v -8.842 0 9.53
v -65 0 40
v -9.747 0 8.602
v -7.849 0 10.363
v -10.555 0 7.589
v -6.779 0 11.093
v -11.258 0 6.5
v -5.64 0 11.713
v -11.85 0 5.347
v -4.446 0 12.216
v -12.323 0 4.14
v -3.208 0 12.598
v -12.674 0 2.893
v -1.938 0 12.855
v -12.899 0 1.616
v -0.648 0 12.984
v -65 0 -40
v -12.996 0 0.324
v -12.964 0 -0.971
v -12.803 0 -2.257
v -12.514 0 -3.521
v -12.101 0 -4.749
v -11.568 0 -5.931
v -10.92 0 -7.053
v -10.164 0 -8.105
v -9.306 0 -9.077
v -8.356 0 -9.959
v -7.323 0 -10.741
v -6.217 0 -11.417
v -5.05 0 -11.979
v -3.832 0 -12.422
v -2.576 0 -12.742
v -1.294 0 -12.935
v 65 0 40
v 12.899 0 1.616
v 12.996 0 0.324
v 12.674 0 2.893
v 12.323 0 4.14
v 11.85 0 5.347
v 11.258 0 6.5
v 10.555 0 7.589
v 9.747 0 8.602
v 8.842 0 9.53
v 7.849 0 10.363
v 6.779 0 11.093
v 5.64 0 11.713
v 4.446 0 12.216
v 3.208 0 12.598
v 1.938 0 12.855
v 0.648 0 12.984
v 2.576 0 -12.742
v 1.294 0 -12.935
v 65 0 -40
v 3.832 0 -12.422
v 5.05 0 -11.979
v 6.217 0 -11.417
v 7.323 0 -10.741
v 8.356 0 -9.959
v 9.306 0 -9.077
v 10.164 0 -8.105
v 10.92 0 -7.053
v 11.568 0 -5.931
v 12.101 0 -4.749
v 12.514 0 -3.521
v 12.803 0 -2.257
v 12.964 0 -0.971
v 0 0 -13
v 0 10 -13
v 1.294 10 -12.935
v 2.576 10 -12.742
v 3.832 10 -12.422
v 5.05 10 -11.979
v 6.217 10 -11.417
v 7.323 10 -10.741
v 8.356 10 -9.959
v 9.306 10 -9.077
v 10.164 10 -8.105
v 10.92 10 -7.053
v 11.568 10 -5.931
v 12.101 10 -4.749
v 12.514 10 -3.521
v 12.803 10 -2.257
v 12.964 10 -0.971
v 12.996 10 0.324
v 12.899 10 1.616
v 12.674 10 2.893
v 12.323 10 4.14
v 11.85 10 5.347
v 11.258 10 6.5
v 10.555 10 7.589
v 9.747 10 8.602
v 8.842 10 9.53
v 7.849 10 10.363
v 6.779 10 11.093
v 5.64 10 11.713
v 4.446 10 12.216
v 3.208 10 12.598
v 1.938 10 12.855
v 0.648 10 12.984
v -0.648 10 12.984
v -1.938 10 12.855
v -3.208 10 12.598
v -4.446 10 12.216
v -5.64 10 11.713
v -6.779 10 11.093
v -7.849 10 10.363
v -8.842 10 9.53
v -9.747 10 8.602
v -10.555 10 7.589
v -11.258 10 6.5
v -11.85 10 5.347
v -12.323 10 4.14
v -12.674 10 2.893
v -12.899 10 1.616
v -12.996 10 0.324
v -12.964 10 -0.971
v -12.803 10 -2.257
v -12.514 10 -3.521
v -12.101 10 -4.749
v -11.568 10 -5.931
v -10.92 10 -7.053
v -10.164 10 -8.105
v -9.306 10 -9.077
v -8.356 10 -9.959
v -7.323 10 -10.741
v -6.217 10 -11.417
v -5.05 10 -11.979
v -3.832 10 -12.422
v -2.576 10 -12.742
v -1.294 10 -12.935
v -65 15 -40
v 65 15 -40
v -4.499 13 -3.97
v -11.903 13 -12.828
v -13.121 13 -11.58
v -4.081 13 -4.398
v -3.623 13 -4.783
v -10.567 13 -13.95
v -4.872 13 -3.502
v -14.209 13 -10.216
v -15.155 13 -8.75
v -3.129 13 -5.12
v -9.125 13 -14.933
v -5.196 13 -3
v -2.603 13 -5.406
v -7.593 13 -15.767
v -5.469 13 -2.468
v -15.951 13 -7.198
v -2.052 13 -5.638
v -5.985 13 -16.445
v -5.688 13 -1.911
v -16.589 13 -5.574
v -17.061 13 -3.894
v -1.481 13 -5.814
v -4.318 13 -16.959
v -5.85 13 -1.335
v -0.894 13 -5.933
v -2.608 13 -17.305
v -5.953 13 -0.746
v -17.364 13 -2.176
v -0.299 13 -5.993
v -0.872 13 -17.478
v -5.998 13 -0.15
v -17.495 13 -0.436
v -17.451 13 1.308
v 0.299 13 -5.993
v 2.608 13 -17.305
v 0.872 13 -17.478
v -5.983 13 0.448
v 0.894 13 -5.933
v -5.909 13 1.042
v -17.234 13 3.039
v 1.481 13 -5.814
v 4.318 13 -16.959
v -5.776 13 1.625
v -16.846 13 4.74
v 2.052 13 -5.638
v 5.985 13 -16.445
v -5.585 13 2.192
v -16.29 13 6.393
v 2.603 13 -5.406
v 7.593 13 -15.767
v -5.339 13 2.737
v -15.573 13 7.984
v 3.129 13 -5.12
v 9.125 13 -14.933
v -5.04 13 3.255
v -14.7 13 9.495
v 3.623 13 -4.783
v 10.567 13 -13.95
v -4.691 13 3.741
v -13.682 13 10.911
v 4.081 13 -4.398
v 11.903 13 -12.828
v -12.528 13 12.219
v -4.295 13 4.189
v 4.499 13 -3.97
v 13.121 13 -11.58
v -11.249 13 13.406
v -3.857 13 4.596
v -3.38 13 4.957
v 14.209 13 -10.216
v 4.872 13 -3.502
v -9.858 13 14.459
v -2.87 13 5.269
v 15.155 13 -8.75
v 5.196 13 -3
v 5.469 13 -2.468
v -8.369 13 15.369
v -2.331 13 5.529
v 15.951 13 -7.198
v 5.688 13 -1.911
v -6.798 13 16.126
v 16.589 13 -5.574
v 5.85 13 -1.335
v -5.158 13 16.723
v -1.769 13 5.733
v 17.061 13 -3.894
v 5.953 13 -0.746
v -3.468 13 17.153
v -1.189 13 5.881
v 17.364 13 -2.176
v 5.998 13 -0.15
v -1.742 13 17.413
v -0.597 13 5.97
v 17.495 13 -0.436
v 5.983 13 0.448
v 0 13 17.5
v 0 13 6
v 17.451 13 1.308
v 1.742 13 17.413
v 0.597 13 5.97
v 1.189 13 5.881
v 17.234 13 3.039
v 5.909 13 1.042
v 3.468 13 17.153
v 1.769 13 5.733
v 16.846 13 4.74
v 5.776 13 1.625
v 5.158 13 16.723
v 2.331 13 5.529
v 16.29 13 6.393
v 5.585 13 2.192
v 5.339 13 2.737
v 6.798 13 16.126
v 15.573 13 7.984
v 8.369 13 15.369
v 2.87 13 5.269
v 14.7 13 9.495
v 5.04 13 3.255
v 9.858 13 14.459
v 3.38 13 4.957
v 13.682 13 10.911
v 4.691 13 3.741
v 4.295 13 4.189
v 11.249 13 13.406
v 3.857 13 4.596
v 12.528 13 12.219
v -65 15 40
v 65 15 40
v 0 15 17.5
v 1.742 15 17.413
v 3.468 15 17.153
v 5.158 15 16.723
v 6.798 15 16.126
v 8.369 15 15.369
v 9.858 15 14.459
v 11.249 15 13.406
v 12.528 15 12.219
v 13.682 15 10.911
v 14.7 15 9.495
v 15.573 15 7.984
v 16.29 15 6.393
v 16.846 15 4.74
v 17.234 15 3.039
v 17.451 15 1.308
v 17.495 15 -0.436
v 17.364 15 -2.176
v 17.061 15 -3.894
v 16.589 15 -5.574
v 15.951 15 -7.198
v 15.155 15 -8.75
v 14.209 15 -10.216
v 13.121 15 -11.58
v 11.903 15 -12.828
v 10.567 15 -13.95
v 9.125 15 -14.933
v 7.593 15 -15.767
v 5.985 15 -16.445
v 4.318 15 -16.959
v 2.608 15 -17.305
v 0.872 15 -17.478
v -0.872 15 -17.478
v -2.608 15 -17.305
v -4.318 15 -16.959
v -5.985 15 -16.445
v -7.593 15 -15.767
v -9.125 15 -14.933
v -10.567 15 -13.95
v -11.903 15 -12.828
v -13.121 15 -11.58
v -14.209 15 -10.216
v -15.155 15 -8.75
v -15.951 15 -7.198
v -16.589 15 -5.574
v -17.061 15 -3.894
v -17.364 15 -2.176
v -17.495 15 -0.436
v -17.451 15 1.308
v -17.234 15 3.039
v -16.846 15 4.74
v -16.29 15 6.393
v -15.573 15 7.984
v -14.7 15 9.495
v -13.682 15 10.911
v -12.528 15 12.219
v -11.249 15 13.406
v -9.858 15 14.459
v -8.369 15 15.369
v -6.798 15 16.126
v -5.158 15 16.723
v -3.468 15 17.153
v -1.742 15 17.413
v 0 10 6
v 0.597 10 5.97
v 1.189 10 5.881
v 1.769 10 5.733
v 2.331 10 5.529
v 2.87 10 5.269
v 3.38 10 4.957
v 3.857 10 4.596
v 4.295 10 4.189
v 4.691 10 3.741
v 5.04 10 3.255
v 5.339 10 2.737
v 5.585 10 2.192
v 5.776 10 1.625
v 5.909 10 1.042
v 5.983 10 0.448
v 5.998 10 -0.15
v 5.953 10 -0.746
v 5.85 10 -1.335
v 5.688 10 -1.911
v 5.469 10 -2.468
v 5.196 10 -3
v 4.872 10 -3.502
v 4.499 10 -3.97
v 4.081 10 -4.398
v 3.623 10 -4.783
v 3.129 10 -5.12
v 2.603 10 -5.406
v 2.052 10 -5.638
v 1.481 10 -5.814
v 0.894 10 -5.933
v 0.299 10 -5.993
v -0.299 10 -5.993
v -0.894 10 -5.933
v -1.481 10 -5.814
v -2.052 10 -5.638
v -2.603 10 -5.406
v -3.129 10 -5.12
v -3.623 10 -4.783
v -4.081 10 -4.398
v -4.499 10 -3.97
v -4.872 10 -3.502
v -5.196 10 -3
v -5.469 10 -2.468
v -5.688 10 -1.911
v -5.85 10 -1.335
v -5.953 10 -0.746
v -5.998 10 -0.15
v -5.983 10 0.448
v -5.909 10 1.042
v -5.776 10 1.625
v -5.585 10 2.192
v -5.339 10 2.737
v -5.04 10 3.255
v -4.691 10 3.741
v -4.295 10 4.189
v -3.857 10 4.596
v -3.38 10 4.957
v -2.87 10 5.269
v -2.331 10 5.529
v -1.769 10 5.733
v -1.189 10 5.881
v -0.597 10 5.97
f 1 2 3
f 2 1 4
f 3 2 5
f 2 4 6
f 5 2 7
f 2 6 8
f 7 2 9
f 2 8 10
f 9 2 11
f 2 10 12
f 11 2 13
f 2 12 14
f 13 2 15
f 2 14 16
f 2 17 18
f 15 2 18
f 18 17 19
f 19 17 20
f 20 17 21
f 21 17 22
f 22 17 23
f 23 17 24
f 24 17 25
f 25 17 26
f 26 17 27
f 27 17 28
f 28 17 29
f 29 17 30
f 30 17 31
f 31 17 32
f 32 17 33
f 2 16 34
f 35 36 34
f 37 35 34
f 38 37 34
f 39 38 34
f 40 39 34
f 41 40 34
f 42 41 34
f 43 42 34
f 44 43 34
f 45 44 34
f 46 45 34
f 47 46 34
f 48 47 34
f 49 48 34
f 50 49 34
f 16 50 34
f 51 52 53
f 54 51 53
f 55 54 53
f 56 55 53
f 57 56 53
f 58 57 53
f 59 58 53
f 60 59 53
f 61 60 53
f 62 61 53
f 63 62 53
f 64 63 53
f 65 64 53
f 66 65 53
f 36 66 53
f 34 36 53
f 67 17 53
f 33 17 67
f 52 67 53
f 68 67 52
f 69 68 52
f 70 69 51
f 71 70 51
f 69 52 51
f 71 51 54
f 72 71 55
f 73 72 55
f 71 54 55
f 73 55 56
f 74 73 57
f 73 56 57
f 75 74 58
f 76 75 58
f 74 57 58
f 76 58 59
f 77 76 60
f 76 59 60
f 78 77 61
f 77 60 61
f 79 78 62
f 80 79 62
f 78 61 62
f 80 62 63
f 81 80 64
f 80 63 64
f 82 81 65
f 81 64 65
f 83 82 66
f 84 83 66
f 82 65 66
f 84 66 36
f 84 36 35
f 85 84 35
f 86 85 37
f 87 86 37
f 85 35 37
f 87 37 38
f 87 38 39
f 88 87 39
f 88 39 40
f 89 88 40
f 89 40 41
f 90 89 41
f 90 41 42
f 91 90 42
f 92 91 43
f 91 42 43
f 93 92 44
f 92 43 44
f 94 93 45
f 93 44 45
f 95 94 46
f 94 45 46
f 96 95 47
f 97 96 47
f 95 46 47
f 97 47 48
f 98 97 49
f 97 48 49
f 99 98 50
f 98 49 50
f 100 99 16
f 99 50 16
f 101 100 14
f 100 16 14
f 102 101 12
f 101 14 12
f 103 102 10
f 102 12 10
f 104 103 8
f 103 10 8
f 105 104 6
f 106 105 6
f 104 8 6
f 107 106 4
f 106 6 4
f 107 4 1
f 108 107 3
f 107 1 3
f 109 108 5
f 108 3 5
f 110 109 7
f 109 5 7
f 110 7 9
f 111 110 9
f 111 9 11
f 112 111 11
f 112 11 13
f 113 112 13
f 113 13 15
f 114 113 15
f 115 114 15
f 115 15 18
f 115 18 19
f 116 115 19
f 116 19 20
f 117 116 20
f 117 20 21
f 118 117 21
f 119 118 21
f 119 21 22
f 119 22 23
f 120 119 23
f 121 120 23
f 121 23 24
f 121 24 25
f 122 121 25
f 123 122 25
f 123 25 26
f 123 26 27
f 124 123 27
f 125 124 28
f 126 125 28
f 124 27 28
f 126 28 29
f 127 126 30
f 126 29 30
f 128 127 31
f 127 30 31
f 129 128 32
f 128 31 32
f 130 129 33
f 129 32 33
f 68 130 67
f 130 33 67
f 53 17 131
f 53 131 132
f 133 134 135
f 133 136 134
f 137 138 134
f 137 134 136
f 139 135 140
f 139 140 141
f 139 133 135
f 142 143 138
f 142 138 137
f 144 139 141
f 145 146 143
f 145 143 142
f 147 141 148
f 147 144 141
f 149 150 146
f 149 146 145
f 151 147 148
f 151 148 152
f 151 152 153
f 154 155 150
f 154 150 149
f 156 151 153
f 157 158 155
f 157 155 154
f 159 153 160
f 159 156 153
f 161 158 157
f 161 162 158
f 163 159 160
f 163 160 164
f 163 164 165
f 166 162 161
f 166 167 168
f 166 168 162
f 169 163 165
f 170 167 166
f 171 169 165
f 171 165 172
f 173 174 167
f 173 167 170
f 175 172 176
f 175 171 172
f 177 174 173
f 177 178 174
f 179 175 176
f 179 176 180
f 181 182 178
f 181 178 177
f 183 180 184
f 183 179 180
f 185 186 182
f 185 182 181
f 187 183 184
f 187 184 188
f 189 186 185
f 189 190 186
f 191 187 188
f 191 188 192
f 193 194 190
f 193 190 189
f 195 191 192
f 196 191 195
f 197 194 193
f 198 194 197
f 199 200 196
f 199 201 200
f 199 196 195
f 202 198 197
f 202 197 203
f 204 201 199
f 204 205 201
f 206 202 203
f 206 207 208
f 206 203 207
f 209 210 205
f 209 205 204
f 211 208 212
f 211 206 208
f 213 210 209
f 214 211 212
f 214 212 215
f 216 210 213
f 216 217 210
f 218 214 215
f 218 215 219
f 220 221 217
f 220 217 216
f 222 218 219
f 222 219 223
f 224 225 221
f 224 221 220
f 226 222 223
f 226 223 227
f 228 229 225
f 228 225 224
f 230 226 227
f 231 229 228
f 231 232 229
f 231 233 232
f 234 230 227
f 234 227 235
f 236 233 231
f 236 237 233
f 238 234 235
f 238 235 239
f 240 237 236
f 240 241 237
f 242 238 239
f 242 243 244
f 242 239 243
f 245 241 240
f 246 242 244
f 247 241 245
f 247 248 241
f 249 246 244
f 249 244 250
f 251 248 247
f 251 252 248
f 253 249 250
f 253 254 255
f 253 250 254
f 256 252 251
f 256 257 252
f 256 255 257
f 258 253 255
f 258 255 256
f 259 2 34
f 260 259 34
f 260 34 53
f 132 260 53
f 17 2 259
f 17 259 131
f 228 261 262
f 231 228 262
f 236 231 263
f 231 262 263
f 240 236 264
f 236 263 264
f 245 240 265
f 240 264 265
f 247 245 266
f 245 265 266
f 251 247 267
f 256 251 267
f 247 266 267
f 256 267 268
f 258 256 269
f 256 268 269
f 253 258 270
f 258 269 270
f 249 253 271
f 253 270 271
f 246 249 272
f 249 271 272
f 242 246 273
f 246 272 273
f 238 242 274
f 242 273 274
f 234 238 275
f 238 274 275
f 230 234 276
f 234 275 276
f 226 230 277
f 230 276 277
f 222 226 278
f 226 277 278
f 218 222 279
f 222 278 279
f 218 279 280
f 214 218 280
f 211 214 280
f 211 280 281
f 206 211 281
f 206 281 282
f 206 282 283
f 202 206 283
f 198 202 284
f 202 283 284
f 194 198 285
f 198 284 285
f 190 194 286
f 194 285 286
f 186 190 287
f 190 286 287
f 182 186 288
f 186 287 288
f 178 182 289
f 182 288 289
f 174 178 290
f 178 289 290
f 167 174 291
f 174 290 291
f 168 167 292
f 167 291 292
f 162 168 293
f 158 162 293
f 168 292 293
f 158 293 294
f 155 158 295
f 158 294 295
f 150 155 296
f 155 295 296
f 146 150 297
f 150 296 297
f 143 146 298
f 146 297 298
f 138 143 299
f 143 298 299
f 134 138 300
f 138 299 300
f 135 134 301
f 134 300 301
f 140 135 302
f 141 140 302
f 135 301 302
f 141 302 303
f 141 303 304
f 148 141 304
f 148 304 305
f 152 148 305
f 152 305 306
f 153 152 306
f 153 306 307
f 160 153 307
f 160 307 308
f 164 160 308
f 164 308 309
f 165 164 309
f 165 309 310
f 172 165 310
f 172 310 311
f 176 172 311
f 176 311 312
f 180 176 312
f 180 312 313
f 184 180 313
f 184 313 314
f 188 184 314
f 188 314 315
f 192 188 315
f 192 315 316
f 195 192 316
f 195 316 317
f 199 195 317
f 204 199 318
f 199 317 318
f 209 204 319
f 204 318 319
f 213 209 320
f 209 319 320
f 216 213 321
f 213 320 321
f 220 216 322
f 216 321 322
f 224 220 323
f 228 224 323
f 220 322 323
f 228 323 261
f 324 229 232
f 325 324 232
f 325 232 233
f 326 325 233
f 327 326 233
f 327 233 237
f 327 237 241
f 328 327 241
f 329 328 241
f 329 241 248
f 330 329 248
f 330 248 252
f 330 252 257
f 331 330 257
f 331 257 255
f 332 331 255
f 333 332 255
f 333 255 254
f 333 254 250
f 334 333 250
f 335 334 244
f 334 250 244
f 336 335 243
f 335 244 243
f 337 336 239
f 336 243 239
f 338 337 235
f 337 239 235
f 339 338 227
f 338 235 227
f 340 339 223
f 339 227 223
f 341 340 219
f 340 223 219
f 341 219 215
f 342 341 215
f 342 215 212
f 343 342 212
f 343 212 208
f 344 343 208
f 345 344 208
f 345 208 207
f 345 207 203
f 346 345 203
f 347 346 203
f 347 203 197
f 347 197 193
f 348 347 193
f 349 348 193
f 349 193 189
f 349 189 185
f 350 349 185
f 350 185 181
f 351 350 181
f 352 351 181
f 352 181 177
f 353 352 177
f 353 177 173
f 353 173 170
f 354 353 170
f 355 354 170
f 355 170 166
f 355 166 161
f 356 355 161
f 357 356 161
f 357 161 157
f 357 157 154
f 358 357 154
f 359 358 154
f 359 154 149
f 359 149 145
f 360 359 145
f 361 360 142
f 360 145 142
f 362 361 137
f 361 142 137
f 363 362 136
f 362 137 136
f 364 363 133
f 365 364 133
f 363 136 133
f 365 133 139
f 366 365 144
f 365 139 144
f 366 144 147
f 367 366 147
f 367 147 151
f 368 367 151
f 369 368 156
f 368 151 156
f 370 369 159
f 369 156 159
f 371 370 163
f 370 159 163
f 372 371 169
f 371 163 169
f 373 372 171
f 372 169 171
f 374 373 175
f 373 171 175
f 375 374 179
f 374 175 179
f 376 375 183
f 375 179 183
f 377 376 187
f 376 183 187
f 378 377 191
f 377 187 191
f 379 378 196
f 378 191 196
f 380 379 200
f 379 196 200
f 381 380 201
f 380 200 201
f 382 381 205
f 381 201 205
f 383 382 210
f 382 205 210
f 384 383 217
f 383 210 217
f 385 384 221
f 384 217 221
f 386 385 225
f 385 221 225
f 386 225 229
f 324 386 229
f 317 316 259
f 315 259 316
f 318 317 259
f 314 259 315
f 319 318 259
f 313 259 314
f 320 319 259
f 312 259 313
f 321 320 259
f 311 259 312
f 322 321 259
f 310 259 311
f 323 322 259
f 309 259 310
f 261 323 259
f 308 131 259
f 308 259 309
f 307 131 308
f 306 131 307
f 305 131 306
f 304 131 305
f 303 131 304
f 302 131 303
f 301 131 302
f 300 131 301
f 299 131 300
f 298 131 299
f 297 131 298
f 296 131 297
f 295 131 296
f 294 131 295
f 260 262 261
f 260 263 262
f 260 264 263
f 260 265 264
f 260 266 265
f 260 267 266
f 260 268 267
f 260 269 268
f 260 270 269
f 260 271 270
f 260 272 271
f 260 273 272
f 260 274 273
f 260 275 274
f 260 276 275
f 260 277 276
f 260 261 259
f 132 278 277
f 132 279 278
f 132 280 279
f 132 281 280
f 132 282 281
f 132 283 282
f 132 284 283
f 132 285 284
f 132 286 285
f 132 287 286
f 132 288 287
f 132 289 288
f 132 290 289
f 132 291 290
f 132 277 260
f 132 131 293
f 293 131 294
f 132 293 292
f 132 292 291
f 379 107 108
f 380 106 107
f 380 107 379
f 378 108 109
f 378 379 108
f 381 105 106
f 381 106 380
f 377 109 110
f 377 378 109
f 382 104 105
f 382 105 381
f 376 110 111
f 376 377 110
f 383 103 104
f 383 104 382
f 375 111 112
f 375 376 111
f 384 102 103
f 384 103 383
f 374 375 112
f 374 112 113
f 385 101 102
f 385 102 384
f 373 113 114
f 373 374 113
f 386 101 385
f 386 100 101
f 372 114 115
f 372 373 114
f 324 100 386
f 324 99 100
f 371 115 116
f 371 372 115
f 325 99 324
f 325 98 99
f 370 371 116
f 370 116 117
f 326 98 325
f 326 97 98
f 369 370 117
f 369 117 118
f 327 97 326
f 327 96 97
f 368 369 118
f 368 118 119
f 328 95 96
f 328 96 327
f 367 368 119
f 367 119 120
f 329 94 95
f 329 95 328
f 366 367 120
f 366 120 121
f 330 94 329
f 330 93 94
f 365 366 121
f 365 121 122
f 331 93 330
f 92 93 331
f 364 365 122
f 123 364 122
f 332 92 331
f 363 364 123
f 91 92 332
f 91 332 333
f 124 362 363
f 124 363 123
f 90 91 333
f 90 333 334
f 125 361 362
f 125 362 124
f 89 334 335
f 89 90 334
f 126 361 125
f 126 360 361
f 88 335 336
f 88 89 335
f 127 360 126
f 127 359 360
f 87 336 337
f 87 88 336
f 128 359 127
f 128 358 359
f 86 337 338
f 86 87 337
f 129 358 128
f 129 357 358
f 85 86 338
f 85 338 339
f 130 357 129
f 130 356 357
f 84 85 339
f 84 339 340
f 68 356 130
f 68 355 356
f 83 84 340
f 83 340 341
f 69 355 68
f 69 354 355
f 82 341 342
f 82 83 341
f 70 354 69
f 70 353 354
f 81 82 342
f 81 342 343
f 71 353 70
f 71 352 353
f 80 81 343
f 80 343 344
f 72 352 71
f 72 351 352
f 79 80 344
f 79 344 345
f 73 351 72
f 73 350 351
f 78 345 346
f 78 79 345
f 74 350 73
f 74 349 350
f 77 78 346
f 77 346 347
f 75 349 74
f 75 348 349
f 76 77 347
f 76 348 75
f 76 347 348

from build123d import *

# Parameters (mm, degrees)
SKETCH_4_W          = 130
SKETCH_4_H          = 80
EXTRUDE_3_DEPTH     = 15
SKETCH_5_R          = 17.5
CUT_EXTRUDE_1_DEPTH = 2
SKETCH_6_R          = 13
CUT_EXTRUDE_2_DEPTH = 10
SKETCH_7_R          = 6
CUT_EXTRUDE_3_DEPTH = 78.420927403


with BuildPart() as part:
    # Эскиз4 → Бобышка-Вытянуть3 (new body)
    with BuildSketch(Plane(origin=(0, 0, 0), x_dir=(1, 0, 0), z_dir=(0, 1, 0))):
        Rectangle(SKETCH_4_W, SKETCH_4_H)
    extrude(amount=EXTRUDE_3_DEPTH)

    # Эскиз5 → Вырез-Вытянуть1 (cut)
    with BuildSketch(Plane(origin=(0, 15, 0), x_dir=(1, 0, 0), z_dir=(0, 1, 0))):
        with Locations(Location((0, 0, 0), (0, 0, 270))):
            Circle(SKETCH_5_R)
    extrude(amount=-CUT_EXTRUDE_1_DEPTH, mode=Mode.SUBTRACT)

    # Эскиз6 → Вырез-Вытянуть2 (cut)
    with BuildSketch(Plane.XZ):
        with Locations(Location((0, 0, 0), (0, 0, 270))):
            Circle(SKETCH_6_R)
    extrude(amount=-CUT_EXTRUDE_2_DEPTH, mode=Mode.SUBTRACT)

    # Эскиз7 → Вырез-Вытянуть3 (cut, through all)
    with BuildSketch(Plane(origin=(0, 13, 0), x_dir=(1, 0, 0), z_dir=(0, 1, 0))):
        with Locations(Location((0, 0, 0), (0, 0, 270))):
            Circle(SKETCH_7_R)
    extrude(amount=-CUT_EXTRUDE_3_DEPTH, mode=Mode.SUBTRACT)


solid = part.part
